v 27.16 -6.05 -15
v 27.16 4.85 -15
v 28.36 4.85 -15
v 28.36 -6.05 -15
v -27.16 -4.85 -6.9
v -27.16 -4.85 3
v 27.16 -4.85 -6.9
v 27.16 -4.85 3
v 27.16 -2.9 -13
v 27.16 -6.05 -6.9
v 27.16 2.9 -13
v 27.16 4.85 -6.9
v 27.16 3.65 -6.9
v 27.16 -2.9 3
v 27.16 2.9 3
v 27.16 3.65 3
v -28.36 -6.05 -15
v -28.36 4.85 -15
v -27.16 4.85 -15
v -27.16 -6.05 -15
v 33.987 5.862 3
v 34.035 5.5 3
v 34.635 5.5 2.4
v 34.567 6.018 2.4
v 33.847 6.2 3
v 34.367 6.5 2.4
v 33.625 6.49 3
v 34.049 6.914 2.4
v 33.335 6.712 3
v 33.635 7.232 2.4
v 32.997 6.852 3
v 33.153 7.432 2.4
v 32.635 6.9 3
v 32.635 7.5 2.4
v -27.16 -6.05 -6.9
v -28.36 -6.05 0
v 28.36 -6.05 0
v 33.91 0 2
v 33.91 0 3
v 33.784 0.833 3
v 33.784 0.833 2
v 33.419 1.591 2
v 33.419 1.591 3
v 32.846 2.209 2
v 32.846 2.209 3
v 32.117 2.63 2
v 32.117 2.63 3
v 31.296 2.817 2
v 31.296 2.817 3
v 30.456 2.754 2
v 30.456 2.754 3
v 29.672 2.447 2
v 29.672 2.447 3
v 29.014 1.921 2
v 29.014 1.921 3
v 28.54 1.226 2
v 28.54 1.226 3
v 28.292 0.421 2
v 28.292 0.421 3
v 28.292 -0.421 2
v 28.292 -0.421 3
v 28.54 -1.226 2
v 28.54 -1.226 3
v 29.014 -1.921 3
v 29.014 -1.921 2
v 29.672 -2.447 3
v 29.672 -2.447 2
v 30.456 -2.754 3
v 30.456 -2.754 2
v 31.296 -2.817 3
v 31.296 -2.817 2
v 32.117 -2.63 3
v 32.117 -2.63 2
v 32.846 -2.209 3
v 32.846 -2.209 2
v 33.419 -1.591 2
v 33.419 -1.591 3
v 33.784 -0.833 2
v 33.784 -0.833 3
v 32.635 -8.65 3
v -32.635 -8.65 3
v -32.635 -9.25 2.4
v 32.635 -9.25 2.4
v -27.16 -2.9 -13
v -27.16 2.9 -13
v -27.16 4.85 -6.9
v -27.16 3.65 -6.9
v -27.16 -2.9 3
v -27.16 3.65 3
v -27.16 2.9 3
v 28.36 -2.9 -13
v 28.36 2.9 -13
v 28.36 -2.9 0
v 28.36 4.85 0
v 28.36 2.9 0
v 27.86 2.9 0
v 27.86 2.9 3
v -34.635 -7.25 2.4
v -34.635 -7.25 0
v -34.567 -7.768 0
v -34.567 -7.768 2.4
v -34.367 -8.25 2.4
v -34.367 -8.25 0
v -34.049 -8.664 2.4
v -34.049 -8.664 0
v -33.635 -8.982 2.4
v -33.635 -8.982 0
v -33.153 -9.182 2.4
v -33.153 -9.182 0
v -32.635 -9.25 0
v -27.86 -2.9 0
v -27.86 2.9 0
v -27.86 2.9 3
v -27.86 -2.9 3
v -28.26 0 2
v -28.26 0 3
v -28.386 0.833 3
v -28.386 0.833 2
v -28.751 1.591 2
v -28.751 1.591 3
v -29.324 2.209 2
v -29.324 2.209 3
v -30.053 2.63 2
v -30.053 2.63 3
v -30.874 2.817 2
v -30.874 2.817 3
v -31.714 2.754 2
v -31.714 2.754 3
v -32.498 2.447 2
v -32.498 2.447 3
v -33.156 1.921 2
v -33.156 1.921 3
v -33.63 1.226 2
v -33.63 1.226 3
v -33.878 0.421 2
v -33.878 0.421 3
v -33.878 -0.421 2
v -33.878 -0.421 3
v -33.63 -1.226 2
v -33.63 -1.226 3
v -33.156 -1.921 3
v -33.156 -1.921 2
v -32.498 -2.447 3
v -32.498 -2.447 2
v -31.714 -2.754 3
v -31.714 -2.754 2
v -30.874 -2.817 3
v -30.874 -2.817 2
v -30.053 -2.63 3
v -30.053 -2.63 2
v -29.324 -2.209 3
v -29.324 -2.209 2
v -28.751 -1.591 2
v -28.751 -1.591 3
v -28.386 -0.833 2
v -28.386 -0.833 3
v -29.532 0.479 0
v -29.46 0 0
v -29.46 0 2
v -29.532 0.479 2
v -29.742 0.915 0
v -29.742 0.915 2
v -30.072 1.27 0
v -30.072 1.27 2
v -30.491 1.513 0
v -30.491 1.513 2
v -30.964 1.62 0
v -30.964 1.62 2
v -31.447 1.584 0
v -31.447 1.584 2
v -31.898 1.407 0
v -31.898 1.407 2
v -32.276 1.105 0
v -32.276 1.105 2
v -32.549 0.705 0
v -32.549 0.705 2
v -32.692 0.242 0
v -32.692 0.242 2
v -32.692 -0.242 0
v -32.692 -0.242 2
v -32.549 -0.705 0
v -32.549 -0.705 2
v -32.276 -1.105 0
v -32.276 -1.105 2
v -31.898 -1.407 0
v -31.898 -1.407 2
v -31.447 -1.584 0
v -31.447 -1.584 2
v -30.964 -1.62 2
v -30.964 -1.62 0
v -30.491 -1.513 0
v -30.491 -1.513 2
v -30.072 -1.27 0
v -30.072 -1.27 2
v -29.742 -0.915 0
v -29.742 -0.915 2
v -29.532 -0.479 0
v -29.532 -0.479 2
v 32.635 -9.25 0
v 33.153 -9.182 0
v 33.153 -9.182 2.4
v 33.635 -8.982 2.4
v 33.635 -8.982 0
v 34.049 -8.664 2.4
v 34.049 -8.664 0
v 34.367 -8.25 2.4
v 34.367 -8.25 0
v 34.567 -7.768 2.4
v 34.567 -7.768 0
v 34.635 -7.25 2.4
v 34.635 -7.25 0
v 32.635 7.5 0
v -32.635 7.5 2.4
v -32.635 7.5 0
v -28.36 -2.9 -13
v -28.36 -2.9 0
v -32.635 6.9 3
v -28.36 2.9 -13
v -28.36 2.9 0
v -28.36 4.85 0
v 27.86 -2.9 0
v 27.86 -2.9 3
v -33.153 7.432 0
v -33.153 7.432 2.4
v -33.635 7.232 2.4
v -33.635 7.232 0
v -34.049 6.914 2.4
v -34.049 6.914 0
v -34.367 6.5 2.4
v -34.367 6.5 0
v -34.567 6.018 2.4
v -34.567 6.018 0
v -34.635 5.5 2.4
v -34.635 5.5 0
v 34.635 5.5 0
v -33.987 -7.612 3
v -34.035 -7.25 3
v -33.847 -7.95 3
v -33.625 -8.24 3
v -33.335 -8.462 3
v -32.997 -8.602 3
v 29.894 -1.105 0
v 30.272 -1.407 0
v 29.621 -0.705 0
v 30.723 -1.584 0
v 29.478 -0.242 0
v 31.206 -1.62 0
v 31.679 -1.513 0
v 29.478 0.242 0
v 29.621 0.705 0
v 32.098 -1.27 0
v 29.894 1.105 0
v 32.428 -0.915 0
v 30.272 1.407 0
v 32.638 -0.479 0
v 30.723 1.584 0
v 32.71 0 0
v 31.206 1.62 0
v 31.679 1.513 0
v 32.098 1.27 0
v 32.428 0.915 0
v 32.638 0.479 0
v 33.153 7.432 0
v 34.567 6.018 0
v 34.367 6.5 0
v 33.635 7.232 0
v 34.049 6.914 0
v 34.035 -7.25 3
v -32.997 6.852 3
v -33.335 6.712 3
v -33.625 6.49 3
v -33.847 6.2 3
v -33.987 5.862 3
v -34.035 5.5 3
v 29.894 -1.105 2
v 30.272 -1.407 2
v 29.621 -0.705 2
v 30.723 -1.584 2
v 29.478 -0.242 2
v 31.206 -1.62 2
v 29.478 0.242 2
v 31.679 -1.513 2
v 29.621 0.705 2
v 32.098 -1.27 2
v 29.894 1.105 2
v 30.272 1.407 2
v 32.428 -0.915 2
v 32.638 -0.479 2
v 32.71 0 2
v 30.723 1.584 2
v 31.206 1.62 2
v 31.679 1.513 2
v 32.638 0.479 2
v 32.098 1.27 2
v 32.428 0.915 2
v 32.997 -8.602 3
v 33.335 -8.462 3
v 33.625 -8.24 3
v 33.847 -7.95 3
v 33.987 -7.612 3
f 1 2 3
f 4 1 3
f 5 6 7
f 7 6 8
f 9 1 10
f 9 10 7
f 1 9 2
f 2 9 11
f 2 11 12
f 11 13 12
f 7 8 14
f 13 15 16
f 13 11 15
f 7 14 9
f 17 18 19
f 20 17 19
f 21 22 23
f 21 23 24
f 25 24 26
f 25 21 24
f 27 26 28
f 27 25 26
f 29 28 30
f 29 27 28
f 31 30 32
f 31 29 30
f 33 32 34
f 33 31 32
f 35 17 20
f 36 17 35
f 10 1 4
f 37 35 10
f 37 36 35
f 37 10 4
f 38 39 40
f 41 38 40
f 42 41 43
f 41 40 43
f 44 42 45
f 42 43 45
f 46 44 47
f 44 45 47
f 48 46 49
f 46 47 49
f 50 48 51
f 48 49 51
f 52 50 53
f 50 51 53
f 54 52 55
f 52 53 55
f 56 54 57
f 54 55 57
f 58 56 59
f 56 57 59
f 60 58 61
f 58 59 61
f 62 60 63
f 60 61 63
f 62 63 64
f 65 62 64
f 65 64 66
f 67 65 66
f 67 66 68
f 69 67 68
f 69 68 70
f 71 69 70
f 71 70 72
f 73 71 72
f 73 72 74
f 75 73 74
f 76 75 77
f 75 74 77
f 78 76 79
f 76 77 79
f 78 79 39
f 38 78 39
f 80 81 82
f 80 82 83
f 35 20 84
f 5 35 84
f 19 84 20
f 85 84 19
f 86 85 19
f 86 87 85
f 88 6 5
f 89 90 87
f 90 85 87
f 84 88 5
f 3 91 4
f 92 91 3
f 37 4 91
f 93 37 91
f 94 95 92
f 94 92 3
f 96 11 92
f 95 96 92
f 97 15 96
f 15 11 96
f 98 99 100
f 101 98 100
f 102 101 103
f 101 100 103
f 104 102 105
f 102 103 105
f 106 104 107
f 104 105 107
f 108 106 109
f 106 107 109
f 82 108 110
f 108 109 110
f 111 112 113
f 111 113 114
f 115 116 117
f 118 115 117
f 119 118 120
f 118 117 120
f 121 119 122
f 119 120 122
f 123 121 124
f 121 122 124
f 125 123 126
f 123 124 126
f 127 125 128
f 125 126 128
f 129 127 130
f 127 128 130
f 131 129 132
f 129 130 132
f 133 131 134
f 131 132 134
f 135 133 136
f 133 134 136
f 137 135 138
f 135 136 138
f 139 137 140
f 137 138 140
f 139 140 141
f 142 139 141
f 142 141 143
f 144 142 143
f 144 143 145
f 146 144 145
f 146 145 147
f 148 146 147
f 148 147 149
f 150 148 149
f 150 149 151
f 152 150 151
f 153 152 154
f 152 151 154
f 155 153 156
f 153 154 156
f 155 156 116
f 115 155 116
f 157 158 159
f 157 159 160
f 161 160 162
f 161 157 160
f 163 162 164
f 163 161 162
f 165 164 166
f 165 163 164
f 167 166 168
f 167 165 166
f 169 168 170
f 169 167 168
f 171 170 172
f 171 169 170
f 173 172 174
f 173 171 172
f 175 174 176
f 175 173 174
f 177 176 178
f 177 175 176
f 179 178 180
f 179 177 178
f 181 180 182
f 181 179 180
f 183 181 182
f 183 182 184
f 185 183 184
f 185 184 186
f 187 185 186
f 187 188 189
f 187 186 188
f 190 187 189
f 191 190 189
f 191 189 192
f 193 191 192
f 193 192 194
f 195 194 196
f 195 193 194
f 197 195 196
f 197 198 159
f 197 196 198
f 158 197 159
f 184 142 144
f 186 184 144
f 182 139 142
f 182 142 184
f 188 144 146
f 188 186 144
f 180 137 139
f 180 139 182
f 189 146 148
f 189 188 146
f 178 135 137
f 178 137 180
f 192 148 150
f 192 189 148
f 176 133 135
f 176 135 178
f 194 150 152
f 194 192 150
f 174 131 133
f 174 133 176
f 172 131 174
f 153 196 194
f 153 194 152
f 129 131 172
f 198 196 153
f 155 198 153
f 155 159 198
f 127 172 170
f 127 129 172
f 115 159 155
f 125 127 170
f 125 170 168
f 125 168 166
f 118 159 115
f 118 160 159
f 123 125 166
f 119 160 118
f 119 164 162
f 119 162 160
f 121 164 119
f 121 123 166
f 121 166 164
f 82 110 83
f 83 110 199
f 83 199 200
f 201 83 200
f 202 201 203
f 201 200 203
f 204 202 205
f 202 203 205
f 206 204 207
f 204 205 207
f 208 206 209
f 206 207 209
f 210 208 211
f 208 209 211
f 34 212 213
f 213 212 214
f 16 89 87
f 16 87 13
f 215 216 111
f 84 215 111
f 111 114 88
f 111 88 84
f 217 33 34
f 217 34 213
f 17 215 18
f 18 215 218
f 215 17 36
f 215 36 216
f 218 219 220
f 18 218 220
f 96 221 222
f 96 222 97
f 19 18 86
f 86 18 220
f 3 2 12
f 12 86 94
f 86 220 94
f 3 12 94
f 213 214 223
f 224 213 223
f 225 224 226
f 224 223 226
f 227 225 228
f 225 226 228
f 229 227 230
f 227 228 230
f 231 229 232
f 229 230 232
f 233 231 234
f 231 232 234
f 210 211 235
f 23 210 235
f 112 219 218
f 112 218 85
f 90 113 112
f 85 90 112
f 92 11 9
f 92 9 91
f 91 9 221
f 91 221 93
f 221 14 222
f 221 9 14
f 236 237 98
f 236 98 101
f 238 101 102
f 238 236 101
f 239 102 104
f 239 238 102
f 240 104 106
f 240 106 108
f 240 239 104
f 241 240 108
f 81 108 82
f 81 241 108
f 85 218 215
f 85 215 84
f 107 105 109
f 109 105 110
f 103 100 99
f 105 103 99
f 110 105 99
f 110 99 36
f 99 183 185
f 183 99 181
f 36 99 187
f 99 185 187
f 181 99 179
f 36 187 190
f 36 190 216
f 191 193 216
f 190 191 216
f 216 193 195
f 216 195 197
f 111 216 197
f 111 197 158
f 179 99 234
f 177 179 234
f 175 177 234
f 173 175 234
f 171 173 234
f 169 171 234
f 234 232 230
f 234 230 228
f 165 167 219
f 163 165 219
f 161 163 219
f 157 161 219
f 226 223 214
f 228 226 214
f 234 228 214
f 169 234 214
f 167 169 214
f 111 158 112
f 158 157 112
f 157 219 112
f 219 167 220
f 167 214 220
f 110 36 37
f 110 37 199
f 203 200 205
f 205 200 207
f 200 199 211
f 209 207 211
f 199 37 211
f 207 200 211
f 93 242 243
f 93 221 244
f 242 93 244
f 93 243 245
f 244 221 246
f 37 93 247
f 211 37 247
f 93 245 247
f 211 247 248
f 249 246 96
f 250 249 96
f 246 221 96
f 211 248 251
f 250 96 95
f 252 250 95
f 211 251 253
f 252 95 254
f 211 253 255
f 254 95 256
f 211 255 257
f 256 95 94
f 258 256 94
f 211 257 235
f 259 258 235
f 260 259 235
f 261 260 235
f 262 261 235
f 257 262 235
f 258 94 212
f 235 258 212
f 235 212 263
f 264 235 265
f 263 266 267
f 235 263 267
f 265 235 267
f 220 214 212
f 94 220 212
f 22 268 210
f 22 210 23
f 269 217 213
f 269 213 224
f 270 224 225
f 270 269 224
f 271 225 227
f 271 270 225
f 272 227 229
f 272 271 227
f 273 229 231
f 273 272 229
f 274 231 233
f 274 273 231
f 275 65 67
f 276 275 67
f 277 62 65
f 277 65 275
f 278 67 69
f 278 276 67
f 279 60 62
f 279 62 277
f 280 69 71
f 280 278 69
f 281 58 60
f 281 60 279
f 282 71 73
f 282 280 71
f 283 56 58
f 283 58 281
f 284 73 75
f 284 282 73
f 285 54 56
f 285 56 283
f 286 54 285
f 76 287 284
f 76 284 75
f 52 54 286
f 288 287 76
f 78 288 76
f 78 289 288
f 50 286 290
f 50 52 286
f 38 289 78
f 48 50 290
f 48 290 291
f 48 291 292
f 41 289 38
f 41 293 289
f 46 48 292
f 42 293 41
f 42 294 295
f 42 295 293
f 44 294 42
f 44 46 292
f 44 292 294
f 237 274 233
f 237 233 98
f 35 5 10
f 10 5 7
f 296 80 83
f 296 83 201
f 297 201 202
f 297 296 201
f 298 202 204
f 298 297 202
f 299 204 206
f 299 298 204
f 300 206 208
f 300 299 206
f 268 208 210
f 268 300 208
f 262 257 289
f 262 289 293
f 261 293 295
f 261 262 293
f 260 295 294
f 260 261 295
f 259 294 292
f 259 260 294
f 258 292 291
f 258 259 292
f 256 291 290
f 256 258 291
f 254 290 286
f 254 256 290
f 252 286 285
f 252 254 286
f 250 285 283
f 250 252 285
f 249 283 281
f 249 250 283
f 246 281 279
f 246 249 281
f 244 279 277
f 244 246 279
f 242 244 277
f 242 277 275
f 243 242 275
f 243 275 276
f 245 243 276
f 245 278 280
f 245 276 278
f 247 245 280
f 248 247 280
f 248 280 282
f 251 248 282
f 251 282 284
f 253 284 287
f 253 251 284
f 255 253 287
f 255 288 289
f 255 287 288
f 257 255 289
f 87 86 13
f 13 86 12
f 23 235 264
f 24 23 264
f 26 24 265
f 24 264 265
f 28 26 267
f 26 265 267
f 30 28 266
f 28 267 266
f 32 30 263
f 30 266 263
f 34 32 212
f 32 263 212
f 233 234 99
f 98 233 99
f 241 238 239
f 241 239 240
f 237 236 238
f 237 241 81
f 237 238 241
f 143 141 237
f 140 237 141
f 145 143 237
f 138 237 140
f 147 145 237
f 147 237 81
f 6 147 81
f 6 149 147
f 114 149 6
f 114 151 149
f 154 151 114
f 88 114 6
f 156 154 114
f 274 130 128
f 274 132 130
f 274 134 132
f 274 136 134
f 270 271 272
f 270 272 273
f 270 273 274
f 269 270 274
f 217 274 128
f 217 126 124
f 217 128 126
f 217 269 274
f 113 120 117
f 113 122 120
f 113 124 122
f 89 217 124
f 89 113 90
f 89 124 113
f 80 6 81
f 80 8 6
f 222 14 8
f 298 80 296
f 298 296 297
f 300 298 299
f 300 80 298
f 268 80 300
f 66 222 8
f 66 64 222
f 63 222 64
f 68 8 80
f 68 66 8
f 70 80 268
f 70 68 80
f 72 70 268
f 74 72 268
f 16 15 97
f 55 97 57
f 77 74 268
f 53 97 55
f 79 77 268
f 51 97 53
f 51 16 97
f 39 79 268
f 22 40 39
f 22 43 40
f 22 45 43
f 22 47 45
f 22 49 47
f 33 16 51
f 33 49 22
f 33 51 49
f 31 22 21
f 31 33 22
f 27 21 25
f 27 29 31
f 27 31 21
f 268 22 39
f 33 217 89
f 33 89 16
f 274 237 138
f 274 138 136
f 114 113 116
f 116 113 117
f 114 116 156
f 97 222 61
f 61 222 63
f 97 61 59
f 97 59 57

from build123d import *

# Parameters (mm, degrees)
FLANGE_DEPTH             = 3
FRONT_BEVEL_SIZE         = 0.6
OPENING_HOLES_DEPTH      = 36.974236962
OPENING_HOLES_DEPTH_BACK = 36.974236962
SK_OPENING_R             = 1.625
SK_COUNTERBORE_R         = 2.825
COUNTERBORE_DEPTH        = 1
SK_LONG_WALLS_W          = 56.72
SK_LONG_WALLS_H          = 1.2
LONG_WALLS_DEPTH         = 6.9
SK_LEGS_W                = 1.2
SK_LEGS_H                = 1.95
SK_LEGS_H_2              = 3.15
LEGS_DEPTH               = 13
SK_LEG_TIES_W            = 1.2
SK_LEG_TIES_H            = 10.9
LEG_TIES_DEPTH           = 2


with BuildPart() as part:
    # SK Flange → Flange (new body)
    with BuildSketch(Plane.XY):
        with BuildLine():
            Line((-32.635, -9.25), (32.635, -9.25))
            ThreePointArc((32.635, -9.25), (34.049213562, -8.664213562), (34.635, -7.25))
            Line((34.635, -7.25), (34.635, 5.5))
            ThreePointArc((34.635, 5.5), (34.049213562, 6.914213562), (32.635, 7.5))
            Line((32.635, 7.5), (-32.635, 7.5))
            ThreePointArc((-32.635, 7.5), (-34.049213562, 6.914213562), (-34.635, 5.5))
            Line((-34.635, 5.5), (-34.635, -7.25))
            ThreePointArc((-34.635, -7.25), (-34.049213562, -8.664213562), (-32.635, -9.25))
        make_face()
    extrude(amount=FLANGE_DEPTH)

    # Front bevel
    front_bevel_edges = [part.edges().sort_by_distance(p)[0] for p in [
        (34.049213562, -8.664213562, 3),
        (34.635, -0.875, 3),
        (34.049213562, 6.914213562, 3),
        (0, 7.5, 3),
        (-34.049213562, 6.914213562, 3),
        (-34.635, -0.875, 3),
        (-34.049213562, -8.664213562, 3),
        (0, -9.25, 3),
    ]]
    chamfer(front_bevel_edges, length=FRONT_BEVEL_SIZE)

    # SK Opening → Opening + holes (cut, two sides: drawn at the far end of the back side and taken through both)
    with BuildSketch(Plane.XY.offset(-OPENING_HOLES_DEPTH_BACK)):
        with Locations((-31.085, 0)):
            Circle(SK_OPENING_R)
        with Locations((31.085, 0)):
            Circle(SK_OPENING_R)
        Polygon((-27.16, -4.85), (27.16, -4.85), (27.16, -2.9), (27.86, -2.9), (27.86, 2.9), (27.16, 2.9), (27.16, 3.65), (-27.16, 3.65), (-27.16, 2.9), (-27.86, 2.9), (-27.86, -2.9), (-27.16, -2.9), align=None)
    extrude(amount=OPENING_HOLES_DEPTH + OPENING_HOLES_DEPTH_BACK, mode=Mode.SUBTRACT)

    # SK Counterbore → Counterbore (cut)
    with BuildSketch(Plane.XY.offset(3)):
        with Locations((-31.085, 0)):
            Circle(SK_COUNTERBORE_R)
        with Locations((31.085, 0)):
            Circle(SK_COUNTERBORE_R)
    extrude(amount=-COUNTERBORE_DEPTH, mode=Mode.SUBTRACT)

    # SK Long walls → Long walls (add)
    with BuildSketch(Plane.XY):
        with Locations((0, 4.25)):
            Rectangle(SK_LONG_WALLS_W, SK_LONG_WALLS_H)
        with Locations((0, -5.45)):
            Rectangle(SK_LONG_WALLS_W, SK_LONG_WALLS_H)
    extrude(amount=-LONG_WALLS_DEPTH)

    # SK Legs → Legs (add)
    with BuildSketch(Plane.XY):
        with Locations((-27.76, 3.875)):
            Rectangle(SK_LEGS_W, SK_LEGS_H)
        with Locations((-27.76, -4.475)):
            Rectangle(SK_LEGS_W, SK_LEGS_H_2)
        with Locations((27.76, 3.875)):
            Rectangle(SK_LEGS_W, SK_LEGS_H)
        with Locations((27.76, -4.475)):
            Rectangle(SK_LEGS_W, SK_LEGS_H_2)
    extrude(amount=-LEGS_DEPTH)

    # SK Leg ties → Leg ties (add)
    with BuildSketch(Plane.XY.offset(-13)):
        with Locations((-27.76, -0.6)):
            Rectangle(SK_LEG_TIES_W, SK_LEG_TIES_H)
        with Locations((27.76, -0.6)):
            Rectangle(SK_LEG_TIES_W, SK_LEG_TIES_H)
    extrude(amount=-LEG_TIES_DEPTH)


solid = part.part
